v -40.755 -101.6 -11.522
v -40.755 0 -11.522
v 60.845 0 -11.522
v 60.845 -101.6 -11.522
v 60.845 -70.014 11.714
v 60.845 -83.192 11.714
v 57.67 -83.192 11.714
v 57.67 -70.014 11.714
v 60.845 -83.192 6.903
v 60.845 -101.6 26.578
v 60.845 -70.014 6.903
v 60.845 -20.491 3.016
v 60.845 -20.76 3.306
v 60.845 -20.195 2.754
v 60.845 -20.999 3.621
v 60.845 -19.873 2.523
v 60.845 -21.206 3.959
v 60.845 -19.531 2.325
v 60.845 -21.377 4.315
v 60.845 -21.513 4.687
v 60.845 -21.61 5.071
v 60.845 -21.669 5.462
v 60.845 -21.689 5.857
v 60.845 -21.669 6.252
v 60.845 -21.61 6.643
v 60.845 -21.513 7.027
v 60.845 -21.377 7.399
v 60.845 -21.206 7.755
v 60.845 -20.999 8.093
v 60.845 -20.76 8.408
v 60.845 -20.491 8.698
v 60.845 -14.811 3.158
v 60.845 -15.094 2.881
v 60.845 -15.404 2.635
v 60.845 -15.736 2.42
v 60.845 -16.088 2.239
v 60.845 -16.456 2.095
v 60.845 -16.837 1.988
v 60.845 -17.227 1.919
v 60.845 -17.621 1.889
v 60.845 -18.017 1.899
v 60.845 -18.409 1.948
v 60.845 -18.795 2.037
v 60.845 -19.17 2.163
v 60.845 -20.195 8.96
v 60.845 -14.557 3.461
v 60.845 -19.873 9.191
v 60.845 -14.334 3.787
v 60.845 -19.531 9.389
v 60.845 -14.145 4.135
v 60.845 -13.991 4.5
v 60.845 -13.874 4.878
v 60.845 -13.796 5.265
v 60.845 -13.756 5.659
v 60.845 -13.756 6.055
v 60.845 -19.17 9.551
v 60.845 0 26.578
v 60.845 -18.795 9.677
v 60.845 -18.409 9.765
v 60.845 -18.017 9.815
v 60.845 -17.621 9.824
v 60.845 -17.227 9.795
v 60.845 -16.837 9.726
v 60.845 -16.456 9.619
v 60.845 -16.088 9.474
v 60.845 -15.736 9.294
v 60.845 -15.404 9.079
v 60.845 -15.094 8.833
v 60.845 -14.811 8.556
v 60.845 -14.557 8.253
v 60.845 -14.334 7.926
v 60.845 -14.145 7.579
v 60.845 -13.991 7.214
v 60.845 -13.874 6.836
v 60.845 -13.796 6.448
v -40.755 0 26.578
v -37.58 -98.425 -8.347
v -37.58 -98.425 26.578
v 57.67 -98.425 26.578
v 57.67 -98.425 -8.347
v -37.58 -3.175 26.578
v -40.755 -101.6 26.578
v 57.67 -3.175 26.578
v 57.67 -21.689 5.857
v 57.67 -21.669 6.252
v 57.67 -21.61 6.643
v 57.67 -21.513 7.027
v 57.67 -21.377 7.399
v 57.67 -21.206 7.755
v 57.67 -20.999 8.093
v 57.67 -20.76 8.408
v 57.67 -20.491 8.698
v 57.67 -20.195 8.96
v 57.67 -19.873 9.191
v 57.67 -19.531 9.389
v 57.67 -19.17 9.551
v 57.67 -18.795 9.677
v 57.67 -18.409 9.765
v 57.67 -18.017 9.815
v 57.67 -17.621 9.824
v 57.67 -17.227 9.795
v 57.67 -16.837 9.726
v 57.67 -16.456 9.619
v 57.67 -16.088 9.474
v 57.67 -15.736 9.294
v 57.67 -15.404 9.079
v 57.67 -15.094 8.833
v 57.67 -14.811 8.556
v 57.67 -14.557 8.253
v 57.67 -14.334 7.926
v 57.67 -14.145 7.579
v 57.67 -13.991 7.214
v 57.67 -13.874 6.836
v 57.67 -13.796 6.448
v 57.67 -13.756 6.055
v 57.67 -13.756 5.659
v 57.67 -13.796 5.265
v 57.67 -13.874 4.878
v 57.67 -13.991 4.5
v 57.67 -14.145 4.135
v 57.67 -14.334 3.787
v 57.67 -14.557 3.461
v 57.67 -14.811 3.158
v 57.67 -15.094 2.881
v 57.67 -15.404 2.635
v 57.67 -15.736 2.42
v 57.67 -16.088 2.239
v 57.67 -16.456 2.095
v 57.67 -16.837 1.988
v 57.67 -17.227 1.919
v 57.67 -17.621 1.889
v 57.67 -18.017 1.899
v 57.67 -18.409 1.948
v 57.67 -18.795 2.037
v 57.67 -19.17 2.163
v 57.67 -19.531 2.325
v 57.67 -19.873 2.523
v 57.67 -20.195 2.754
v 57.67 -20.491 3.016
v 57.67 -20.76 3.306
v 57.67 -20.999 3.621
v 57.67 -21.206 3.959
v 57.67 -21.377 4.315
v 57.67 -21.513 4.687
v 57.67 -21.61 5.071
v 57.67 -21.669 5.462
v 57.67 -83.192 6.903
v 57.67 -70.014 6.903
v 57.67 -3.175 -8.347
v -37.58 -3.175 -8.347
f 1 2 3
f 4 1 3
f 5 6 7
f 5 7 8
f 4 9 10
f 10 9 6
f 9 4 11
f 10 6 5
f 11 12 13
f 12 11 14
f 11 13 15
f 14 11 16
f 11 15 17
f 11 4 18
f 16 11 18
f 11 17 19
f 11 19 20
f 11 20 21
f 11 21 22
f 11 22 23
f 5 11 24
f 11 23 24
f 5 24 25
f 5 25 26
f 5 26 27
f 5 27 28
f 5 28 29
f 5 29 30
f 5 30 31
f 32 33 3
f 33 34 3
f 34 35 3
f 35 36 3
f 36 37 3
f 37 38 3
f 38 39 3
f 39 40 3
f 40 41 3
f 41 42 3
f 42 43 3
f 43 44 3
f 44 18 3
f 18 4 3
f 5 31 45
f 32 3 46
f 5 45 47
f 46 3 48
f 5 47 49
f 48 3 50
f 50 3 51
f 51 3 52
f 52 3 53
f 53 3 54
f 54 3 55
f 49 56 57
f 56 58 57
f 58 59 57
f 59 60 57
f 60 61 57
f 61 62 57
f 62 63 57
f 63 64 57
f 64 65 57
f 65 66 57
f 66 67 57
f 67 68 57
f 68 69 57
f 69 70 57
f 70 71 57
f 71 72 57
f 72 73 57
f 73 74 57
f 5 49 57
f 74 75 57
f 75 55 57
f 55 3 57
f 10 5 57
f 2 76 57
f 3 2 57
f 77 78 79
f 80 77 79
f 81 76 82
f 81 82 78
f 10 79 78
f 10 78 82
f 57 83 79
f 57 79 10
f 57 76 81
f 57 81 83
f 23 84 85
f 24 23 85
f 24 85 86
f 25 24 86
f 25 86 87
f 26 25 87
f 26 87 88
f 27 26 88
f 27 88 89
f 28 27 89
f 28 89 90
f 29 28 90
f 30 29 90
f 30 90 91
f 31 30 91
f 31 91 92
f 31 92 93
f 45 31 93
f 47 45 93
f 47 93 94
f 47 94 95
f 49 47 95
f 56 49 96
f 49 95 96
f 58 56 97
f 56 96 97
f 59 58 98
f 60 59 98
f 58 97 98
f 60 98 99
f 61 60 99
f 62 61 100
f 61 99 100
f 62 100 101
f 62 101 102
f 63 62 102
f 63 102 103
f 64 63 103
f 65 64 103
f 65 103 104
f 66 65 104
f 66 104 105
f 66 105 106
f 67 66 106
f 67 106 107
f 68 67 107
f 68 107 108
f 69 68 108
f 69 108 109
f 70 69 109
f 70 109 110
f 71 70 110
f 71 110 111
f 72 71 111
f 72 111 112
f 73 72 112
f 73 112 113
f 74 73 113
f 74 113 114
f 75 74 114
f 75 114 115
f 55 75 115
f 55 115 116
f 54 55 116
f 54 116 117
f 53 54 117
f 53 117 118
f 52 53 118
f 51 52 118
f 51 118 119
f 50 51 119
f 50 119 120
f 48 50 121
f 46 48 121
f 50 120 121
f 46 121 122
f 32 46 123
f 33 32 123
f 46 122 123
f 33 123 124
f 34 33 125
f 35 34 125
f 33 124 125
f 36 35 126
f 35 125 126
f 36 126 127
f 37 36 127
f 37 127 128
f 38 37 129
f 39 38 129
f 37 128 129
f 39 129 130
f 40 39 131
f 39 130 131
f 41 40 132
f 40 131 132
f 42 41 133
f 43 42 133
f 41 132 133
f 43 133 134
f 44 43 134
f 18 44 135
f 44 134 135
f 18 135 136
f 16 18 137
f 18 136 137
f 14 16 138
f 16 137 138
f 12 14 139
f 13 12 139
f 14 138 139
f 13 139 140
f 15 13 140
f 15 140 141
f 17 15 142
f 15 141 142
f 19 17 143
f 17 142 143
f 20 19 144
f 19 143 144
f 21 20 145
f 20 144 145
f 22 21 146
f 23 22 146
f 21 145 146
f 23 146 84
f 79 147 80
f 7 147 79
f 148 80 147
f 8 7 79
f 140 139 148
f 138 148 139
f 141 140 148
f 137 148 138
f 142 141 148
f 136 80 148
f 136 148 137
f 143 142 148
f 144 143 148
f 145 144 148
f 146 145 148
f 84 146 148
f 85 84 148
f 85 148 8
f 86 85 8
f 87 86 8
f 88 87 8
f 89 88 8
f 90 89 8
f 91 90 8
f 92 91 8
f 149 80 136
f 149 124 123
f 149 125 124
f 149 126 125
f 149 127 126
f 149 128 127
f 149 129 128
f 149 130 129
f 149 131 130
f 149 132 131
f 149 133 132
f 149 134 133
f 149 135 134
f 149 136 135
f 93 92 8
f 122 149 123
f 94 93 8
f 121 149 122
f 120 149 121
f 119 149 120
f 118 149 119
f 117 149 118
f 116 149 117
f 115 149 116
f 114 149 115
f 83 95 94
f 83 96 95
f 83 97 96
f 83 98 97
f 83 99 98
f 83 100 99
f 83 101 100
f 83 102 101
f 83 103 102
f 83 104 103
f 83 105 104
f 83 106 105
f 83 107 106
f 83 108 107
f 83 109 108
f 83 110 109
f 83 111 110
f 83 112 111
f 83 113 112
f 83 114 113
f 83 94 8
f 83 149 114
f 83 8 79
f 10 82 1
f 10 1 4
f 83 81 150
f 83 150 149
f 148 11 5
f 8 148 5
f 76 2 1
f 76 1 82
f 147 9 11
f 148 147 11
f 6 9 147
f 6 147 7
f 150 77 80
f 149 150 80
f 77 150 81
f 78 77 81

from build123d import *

# Parameters (mm, degrees)
F0_W     = 101.6
F0_H     = 38.1
F1_DEPTH = 101.6
F2_T     = -3.175
F4_D     = 7.9375
F4_DEPTH = 12.7
F4_TIP   = 2.3846655818
F3_W     = 13.1781175733
F3_H     = 4.8110592179
F5_DEPTH = 3.175


# Not quite as in the source:
# - a length typed as a fraction of an inch, garbled in the dataset ("3 / 203.2 mm" for 3/8 in), is restored


with BuildPart() as f1:
    # F0 (on Front) → F1 (new body)
    with BuildSketch(Plane.XZ):
        with Locations((10.0446864963, 7.5280469467)):
            Rectangle(F0_W, F0_H)
    extrude(amount=F1_DEPTH)

    # F2
    f2_openings = [f1.faces().sort_by_distance(p)[0] for p in [
        (10.044686, -50.8, 26.578047),
    ]]
    offset(amount=F2_T, openings=f2_openings)

    # F4
    with Locations(Plane.YZ.offset(60.8446864963)):
        with Locations((-17.720233649, 5.8569414541)):
            Hole(F4_D / 2, depth=F4_DEPTH)
            with Locations((0, 0, -(F4_DEPTH + F4_TIP / 2))):  # 118° drill point
                Cone(0, F4_D / 2, F4_TIP, mode=Mode.SUBTRACT)

    # F3 (on face) → F5 (cut, through all)
    with BuildSketch(Plane.YZ.offset(60.8446864963)):
        with Locations((-76.6034089029, 9.3083532993)):
            Rectangle(F3_W, F3_H)
    extrude(amount=-F5_DEPTH, mode=Mode.SUBTRACT)


solid = f1.part
